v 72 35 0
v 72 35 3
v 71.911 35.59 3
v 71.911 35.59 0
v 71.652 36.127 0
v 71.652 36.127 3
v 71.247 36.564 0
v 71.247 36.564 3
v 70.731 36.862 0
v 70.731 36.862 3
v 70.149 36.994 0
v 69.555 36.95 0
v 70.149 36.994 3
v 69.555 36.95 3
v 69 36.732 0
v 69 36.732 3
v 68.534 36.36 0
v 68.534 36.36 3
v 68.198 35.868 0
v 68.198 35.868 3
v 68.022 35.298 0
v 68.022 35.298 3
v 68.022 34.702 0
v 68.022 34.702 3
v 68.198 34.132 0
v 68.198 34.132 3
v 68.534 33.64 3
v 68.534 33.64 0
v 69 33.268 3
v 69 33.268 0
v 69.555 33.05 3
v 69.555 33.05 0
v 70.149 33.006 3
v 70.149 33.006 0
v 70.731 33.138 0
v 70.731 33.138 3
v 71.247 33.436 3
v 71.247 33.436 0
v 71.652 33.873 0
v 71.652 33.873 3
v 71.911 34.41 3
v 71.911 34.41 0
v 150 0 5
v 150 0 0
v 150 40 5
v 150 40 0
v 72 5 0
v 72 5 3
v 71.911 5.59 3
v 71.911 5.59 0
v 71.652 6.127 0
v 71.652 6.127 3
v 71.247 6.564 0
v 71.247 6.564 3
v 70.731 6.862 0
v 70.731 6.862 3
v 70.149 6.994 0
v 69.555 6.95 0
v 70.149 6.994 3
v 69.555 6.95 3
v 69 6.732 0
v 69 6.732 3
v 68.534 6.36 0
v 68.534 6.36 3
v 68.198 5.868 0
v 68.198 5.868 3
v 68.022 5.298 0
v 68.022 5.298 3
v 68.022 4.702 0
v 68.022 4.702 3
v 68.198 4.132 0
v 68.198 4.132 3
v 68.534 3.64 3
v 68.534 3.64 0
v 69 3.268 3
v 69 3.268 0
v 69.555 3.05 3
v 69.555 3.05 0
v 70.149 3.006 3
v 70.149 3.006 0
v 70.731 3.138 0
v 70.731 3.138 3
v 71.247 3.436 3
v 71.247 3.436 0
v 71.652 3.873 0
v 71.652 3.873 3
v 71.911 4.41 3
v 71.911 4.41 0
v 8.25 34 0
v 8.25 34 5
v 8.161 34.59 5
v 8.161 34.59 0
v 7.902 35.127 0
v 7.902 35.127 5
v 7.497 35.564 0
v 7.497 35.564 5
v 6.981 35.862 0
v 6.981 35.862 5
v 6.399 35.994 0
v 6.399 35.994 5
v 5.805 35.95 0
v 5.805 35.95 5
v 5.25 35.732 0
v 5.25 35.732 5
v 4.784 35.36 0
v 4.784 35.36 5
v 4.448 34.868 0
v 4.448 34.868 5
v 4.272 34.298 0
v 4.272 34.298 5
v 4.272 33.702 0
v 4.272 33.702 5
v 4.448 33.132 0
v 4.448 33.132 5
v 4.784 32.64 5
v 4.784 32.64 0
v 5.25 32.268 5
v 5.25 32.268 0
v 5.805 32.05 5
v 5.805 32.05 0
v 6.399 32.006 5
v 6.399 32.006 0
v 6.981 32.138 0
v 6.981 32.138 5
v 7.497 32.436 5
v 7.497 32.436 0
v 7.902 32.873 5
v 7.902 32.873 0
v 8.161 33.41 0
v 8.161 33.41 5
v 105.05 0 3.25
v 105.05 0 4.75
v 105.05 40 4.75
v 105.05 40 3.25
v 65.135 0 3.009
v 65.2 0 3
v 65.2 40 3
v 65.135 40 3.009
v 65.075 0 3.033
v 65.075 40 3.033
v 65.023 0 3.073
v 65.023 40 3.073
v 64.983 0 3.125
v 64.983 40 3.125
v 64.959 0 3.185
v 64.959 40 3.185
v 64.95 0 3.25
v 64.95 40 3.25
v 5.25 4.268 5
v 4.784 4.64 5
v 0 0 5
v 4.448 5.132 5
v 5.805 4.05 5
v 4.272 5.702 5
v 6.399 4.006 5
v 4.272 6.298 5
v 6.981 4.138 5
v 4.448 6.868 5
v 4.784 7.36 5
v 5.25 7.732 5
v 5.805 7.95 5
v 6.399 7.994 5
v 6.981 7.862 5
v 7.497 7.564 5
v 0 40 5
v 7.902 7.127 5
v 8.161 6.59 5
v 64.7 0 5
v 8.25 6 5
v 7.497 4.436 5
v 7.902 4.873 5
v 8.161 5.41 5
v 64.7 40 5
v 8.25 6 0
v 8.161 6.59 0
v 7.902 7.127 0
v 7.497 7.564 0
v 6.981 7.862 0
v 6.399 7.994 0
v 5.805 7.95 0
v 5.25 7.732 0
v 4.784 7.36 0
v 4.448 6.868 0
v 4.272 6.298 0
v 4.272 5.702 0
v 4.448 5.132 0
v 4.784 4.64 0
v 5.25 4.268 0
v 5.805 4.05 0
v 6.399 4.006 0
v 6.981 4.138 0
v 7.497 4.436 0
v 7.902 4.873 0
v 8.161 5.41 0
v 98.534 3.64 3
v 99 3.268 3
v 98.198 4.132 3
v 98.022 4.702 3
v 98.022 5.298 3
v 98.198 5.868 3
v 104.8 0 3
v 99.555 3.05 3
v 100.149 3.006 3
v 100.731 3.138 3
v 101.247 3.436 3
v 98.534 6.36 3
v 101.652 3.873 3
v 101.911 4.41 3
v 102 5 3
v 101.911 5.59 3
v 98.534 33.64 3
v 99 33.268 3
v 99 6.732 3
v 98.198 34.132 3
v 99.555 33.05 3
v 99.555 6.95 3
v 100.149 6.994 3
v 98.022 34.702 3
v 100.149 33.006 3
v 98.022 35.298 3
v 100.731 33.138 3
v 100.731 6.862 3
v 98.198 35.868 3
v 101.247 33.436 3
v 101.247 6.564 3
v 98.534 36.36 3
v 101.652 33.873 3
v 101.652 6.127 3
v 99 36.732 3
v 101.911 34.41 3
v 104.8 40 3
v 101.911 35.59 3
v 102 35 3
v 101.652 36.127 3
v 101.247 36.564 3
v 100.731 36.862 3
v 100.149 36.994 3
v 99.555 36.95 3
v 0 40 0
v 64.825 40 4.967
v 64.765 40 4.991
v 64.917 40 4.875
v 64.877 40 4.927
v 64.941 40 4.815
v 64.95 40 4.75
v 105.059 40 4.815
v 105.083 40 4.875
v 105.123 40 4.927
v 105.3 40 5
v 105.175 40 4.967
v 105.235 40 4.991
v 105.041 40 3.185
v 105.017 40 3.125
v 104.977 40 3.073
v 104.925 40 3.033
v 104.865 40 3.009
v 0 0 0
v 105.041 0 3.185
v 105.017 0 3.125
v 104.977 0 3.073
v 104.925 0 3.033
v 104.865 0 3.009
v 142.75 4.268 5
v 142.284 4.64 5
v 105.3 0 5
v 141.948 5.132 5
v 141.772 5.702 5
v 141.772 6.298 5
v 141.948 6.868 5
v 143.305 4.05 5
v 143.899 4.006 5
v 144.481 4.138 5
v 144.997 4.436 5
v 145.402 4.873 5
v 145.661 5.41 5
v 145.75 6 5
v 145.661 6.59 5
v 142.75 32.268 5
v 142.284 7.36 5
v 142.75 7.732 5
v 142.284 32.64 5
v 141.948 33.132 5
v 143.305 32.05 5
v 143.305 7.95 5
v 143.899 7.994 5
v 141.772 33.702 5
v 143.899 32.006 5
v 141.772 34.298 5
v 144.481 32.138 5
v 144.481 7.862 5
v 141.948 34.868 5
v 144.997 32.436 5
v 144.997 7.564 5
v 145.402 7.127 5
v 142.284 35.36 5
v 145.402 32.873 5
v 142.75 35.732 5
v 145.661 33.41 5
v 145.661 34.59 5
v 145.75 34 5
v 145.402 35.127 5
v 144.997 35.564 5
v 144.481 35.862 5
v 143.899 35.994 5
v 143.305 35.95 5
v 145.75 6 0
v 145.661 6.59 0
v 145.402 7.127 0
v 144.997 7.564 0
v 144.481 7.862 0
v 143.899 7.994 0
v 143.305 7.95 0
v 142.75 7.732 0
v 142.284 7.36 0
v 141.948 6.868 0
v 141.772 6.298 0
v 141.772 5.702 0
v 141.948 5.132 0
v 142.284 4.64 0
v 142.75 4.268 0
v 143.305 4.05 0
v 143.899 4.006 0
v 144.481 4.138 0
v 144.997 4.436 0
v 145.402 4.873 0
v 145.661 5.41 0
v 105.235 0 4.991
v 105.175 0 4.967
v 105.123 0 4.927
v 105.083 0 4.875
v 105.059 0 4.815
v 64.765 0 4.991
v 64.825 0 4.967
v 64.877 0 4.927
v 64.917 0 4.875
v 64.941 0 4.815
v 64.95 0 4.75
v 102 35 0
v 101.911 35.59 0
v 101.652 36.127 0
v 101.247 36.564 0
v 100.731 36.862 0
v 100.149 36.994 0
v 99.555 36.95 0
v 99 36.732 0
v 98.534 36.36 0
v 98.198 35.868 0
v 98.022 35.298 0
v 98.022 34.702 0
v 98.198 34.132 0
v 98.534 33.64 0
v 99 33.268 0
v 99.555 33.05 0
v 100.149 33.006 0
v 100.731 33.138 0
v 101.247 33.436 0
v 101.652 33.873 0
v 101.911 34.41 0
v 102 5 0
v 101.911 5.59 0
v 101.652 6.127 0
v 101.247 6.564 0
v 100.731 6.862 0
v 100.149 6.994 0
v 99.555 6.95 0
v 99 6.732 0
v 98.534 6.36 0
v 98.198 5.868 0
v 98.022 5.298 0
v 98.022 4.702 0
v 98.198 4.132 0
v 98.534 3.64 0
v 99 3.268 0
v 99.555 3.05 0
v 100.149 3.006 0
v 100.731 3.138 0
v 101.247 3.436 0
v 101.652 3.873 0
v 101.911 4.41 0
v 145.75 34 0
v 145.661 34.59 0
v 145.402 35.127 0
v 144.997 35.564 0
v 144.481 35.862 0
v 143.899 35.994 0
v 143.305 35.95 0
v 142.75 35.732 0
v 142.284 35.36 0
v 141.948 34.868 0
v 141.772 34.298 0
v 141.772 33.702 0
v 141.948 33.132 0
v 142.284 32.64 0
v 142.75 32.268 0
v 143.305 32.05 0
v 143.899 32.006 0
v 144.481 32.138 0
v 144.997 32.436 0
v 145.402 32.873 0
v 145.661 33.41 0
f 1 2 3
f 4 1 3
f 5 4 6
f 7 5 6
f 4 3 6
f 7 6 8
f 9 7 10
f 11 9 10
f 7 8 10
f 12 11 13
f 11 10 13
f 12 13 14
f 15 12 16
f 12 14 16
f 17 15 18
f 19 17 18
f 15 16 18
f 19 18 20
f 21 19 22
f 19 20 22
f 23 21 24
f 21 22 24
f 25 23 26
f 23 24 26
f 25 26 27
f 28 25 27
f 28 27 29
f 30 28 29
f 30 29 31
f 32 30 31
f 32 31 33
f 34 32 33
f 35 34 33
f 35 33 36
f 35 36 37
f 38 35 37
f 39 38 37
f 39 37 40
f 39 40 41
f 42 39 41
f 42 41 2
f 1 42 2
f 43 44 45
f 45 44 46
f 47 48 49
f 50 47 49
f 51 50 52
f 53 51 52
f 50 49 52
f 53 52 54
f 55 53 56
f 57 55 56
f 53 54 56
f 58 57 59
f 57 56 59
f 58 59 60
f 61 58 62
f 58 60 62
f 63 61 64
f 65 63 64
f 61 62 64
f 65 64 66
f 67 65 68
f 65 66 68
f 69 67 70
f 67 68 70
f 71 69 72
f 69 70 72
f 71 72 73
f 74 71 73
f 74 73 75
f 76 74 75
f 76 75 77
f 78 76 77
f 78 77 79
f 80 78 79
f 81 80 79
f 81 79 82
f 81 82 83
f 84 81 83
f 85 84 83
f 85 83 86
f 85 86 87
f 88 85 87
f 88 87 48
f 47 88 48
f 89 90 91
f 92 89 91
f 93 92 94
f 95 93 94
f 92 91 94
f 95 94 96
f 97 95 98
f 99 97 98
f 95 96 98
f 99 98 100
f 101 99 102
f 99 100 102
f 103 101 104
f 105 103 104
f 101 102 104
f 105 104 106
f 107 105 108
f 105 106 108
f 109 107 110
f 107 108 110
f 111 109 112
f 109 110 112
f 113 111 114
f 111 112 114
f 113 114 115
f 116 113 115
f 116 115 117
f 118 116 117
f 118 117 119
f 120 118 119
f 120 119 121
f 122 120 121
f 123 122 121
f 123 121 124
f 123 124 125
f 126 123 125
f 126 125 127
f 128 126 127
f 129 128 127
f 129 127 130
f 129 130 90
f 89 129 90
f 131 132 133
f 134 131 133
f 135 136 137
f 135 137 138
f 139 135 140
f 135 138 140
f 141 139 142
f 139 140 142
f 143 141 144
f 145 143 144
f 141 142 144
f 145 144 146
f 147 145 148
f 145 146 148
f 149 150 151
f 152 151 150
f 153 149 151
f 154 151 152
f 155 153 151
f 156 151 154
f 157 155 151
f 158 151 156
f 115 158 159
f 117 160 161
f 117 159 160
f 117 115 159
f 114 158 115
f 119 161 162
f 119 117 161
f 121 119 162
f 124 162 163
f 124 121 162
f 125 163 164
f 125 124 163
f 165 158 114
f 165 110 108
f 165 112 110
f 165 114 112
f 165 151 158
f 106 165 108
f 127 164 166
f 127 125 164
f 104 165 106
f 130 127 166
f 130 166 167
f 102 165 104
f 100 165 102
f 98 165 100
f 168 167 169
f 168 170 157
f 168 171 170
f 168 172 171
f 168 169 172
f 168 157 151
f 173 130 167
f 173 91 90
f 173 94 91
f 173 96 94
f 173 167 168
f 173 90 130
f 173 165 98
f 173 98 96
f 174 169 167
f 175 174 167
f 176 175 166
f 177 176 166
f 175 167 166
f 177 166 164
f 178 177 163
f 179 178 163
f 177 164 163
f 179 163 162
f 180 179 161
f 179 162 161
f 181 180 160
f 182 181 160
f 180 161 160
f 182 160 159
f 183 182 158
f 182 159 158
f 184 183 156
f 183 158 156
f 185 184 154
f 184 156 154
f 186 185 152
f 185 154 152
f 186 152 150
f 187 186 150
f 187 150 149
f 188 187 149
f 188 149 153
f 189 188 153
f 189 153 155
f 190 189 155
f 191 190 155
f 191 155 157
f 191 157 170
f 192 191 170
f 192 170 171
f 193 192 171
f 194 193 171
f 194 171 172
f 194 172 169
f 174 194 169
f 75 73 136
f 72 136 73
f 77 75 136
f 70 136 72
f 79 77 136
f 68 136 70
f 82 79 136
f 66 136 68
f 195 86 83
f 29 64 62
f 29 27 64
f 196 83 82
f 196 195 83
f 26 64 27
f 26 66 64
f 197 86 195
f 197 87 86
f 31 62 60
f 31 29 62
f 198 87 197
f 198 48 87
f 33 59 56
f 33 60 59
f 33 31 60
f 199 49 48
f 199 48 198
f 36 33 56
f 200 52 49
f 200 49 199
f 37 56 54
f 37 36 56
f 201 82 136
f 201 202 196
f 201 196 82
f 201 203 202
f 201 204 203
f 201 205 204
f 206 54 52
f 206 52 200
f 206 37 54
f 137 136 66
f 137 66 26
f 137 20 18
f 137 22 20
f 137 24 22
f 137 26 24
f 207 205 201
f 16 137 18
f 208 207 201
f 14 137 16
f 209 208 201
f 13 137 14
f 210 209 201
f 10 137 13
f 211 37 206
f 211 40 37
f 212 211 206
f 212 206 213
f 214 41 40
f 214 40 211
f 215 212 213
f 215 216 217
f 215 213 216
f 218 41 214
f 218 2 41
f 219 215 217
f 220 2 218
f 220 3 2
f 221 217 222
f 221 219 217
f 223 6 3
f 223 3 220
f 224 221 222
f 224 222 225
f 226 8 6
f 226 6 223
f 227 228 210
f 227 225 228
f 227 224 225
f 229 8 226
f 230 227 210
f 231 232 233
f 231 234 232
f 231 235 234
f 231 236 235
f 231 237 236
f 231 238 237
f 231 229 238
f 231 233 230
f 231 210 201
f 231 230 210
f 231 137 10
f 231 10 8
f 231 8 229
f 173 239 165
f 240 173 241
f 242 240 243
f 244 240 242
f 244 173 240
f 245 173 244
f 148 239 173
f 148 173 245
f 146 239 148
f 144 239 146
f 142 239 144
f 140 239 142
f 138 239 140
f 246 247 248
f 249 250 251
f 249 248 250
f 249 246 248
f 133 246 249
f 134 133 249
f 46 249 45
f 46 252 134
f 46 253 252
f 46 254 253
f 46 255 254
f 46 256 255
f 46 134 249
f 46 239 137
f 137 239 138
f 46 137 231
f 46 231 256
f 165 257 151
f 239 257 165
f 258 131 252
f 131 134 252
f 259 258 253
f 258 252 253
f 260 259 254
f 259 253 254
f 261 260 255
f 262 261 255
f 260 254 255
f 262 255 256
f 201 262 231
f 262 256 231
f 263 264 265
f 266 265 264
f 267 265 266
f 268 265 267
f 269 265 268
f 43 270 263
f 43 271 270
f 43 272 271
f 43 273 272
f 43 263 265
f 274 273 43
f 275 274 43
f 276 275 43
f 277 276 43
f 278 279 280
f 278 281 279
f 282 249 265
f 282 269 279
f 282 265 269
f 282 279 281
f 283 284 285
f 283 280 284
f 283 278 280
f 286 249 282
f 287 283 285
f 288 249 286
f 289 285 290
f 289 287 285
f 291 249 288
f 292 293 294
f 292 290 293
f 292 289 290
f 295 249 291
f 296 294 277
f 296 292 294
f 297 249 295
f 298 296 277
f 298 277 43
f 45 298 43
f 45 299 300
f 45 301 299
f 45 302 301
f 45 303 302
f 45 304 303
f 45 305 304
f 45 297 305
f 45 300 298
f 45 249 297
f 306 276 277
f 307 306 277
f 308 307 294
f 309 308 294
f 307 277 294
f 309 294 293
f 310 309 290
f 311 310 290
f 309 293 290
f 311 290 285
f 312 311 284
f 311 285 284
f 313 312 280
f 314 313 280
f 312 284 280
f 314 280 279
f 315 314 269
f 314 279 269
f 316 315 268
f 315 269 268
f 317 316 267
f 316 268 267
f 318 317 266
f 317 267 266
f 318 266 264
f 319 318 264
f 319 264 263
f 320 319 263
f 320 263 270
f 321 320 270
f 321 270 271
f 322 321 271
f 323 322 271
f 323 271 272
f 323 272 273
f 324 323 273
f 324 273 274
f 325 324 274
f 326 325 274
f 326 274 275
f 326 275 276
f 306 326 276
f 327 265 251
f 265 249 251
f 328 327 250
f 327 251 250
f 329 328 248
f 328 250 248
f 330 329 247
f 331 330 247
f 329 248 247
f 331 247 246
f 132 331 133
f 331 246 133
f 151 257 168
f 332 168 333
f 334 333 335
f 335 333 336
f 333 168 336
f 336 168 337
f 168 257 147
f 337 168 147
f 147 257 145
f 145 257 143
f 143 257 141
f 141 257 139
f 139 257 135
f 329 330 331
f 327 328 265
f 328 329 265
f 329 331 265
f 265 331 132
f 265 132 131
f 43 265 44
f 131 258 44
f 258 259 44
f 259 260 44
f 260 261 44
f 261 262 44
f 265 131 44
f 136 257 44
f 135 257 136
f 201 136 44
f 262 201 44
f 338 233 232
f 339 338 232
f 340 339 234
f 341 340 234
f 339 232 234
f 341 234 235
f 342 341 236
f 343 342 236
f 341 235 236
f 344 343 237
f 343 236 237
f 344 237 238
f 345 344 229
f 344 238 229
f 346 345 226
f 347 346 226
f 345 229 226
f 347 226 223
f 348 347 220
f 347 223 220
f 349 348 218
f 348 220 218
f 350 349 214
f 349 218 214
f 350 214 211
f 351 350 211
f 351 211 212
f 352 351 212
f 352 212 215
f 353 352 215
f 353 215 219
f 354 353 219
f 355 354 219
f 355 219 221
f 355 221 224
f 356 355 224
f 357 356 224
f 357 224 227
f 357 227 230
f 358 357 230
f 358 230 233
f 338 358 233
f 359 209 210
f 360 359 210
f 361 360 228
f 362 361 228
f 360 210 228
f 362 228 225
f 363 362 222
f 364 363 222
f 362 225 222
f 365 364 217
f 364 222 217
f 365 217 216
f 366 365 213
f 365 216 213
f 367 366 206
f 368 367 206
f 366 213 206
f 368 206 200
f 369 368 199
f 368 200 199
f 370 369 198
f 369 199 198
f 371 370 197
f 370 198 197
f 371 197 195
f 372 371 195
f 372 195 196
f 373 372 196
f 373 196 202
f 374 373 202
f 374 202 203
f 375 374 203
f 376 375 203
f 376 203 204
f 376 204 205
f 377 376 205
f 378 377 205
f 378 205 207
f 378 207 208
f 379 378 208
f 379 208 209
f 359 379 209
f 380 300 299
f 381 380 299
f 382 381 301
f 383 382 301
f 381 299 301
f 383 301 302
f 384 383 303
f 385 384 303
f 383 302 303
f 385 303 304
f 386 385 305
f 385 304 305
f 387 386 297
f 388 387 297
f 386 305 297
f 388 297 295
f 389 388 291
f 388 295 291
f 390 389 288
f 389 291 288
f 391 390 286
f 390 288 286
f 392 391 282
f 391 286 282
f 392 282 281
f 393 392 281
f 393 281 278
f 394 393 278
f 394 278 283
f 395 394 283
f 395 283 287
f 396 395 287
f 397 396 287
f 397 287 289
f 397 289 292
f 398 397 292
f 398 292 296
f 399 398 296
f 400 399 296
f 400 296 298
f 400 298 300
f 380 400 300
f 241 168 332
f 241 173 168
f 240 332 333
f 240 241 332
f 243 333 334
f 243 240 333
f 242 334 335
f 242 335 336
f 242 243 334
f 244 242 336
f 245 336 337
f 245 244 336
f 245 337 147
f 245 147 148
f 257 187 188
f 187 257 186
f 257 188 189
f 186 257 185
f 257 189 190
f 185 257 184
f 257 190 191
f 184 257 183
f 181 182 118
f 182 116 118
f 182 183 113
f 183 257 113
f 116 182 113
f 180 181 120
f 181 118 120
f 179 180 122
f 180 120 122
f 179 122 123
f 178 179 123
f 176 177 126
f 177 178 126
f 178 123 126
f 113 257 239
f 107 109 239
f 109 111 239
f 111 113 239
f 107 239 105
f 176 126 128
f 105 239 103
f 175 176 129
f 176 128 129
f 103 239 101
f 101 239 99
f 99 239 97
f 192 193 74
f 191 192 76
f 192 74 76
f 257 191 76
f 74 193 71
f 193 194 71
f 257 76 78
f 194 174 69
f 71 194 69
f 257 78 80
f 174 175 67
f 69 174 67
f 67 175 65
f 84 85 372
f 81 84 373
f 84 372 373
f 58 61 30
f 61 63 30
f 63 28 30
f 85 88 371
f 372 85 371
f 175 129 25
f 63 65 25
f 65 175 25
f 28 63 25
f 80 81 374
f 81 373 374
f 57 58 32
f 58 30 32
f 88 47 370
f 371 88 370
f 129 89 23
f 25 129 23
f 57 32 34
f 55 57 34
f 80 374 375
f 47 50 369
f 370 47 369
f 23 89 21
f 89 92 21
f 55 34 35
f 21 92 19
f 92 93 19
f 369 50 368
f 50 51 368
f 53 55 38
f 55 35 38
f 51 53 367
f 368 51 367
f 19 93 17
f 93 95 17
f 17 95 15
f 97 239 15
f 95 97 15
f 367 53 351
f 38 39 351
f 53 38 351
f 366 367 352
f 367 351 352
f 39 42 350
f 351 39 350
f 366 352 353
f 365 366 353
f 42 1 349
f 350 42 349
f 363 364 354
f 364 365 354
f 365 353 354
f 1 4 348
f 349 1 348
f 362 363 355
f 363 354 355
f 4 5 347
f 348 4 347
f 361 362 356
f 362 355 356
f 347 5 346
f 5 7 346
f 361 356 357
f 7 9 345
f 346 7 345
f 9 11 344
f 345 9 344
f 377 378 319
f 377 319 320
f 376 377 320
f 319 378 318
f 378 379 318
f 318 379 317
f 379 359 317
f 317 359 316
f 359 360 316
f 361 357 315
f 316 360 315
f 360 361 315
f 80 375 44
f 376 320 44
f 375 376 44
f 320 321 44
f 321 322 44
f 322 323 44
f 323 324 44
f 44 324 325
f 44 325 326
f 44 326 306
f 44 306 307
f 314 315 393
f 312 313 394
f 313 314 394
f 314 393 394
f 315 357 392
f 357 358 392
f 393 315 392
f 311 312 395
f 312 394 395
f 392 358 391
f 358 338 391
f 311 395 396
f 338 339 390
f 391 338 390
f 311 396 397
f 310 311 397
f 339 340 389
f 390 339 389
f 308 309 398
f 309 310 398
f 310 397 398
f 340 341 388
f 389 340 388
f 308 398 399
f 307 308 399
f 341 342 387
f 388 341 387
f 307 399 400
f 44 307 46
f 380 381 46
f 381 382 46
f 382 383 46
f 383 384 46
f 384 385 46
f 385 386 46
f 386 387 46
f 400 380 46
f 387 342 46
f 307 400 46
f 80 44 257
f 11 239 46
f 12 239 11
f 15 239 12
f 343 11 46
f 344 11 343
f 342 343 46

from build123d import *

# Parameters (mm, degrees)
F0_W     = 150
F0_H     = 40
F1_DEPTH = 5
F2_R     = 2
F3_DEPTH = 25
F4_R     = 2
F5_DEPTH = 25
F6_W     = 40.1
F6_H     = 40
F7_DEPTH = 2
F8_R     = 0.25


with BuildPart() as f1:
    # F0 (on Top) → F1 (new body)
    with BuildSketch(Plane.XY):
        with Locations((75, 20)):
            Rectangle(F0_W, F0_H)
    extrude(amount=F1_DEPTH)

    # F2 (on face) → F3 (cut)
    with BuildSketch(Plane.XY.offset(5)):
        with Locations((6.25, 34)):
            Circle(F2_R)
        with Locations((6.25, 6)):
            Circle(F2_R)
        with Locations((143.75, 34)):
            Circle(F2_R)
        with Locations((143.75, 6)):
            Circle(F2_R)
    extrude(amount=-F3_DEPTH, mode=Mode.SUBTRACT)

    # F4 (on face) → F5 (cut)
    with BuildSketch(Plane.XY.offset(5)):
        with Locations((70, 35)):
            Circle(F4_R)
        with Locations((70, 5)):
            Circle(F4_R)
        with Locations((100, 35)):
            Circle(F4_R)
        with Locations((100, 5)):
            Circle(F4_R)
    extrude(amount=-F5_DEPTH, mode=Mode.SUBTRACT)

    # F6 (on face) → F7 (cut)
    with BuildSketch(Plane.XY.offset(5)):
        with Locations((85, 20)):
            Rectangle(F6_W, F6_H)
    extrude(amount=-F7_DEPTH, mode=Mode.SUBTRACT)

    # F8
    f8_edges = [f1.edges().sort_by_distance(p)[0] for p in [
        (64.95, 20, 5),
        (64.95, 20, 3),
        (105.05, 20, 5),
        (105.05, 20, 3),
    ]]
    fillet(f8_edges, radius=F8_R)


solid = f1.part
